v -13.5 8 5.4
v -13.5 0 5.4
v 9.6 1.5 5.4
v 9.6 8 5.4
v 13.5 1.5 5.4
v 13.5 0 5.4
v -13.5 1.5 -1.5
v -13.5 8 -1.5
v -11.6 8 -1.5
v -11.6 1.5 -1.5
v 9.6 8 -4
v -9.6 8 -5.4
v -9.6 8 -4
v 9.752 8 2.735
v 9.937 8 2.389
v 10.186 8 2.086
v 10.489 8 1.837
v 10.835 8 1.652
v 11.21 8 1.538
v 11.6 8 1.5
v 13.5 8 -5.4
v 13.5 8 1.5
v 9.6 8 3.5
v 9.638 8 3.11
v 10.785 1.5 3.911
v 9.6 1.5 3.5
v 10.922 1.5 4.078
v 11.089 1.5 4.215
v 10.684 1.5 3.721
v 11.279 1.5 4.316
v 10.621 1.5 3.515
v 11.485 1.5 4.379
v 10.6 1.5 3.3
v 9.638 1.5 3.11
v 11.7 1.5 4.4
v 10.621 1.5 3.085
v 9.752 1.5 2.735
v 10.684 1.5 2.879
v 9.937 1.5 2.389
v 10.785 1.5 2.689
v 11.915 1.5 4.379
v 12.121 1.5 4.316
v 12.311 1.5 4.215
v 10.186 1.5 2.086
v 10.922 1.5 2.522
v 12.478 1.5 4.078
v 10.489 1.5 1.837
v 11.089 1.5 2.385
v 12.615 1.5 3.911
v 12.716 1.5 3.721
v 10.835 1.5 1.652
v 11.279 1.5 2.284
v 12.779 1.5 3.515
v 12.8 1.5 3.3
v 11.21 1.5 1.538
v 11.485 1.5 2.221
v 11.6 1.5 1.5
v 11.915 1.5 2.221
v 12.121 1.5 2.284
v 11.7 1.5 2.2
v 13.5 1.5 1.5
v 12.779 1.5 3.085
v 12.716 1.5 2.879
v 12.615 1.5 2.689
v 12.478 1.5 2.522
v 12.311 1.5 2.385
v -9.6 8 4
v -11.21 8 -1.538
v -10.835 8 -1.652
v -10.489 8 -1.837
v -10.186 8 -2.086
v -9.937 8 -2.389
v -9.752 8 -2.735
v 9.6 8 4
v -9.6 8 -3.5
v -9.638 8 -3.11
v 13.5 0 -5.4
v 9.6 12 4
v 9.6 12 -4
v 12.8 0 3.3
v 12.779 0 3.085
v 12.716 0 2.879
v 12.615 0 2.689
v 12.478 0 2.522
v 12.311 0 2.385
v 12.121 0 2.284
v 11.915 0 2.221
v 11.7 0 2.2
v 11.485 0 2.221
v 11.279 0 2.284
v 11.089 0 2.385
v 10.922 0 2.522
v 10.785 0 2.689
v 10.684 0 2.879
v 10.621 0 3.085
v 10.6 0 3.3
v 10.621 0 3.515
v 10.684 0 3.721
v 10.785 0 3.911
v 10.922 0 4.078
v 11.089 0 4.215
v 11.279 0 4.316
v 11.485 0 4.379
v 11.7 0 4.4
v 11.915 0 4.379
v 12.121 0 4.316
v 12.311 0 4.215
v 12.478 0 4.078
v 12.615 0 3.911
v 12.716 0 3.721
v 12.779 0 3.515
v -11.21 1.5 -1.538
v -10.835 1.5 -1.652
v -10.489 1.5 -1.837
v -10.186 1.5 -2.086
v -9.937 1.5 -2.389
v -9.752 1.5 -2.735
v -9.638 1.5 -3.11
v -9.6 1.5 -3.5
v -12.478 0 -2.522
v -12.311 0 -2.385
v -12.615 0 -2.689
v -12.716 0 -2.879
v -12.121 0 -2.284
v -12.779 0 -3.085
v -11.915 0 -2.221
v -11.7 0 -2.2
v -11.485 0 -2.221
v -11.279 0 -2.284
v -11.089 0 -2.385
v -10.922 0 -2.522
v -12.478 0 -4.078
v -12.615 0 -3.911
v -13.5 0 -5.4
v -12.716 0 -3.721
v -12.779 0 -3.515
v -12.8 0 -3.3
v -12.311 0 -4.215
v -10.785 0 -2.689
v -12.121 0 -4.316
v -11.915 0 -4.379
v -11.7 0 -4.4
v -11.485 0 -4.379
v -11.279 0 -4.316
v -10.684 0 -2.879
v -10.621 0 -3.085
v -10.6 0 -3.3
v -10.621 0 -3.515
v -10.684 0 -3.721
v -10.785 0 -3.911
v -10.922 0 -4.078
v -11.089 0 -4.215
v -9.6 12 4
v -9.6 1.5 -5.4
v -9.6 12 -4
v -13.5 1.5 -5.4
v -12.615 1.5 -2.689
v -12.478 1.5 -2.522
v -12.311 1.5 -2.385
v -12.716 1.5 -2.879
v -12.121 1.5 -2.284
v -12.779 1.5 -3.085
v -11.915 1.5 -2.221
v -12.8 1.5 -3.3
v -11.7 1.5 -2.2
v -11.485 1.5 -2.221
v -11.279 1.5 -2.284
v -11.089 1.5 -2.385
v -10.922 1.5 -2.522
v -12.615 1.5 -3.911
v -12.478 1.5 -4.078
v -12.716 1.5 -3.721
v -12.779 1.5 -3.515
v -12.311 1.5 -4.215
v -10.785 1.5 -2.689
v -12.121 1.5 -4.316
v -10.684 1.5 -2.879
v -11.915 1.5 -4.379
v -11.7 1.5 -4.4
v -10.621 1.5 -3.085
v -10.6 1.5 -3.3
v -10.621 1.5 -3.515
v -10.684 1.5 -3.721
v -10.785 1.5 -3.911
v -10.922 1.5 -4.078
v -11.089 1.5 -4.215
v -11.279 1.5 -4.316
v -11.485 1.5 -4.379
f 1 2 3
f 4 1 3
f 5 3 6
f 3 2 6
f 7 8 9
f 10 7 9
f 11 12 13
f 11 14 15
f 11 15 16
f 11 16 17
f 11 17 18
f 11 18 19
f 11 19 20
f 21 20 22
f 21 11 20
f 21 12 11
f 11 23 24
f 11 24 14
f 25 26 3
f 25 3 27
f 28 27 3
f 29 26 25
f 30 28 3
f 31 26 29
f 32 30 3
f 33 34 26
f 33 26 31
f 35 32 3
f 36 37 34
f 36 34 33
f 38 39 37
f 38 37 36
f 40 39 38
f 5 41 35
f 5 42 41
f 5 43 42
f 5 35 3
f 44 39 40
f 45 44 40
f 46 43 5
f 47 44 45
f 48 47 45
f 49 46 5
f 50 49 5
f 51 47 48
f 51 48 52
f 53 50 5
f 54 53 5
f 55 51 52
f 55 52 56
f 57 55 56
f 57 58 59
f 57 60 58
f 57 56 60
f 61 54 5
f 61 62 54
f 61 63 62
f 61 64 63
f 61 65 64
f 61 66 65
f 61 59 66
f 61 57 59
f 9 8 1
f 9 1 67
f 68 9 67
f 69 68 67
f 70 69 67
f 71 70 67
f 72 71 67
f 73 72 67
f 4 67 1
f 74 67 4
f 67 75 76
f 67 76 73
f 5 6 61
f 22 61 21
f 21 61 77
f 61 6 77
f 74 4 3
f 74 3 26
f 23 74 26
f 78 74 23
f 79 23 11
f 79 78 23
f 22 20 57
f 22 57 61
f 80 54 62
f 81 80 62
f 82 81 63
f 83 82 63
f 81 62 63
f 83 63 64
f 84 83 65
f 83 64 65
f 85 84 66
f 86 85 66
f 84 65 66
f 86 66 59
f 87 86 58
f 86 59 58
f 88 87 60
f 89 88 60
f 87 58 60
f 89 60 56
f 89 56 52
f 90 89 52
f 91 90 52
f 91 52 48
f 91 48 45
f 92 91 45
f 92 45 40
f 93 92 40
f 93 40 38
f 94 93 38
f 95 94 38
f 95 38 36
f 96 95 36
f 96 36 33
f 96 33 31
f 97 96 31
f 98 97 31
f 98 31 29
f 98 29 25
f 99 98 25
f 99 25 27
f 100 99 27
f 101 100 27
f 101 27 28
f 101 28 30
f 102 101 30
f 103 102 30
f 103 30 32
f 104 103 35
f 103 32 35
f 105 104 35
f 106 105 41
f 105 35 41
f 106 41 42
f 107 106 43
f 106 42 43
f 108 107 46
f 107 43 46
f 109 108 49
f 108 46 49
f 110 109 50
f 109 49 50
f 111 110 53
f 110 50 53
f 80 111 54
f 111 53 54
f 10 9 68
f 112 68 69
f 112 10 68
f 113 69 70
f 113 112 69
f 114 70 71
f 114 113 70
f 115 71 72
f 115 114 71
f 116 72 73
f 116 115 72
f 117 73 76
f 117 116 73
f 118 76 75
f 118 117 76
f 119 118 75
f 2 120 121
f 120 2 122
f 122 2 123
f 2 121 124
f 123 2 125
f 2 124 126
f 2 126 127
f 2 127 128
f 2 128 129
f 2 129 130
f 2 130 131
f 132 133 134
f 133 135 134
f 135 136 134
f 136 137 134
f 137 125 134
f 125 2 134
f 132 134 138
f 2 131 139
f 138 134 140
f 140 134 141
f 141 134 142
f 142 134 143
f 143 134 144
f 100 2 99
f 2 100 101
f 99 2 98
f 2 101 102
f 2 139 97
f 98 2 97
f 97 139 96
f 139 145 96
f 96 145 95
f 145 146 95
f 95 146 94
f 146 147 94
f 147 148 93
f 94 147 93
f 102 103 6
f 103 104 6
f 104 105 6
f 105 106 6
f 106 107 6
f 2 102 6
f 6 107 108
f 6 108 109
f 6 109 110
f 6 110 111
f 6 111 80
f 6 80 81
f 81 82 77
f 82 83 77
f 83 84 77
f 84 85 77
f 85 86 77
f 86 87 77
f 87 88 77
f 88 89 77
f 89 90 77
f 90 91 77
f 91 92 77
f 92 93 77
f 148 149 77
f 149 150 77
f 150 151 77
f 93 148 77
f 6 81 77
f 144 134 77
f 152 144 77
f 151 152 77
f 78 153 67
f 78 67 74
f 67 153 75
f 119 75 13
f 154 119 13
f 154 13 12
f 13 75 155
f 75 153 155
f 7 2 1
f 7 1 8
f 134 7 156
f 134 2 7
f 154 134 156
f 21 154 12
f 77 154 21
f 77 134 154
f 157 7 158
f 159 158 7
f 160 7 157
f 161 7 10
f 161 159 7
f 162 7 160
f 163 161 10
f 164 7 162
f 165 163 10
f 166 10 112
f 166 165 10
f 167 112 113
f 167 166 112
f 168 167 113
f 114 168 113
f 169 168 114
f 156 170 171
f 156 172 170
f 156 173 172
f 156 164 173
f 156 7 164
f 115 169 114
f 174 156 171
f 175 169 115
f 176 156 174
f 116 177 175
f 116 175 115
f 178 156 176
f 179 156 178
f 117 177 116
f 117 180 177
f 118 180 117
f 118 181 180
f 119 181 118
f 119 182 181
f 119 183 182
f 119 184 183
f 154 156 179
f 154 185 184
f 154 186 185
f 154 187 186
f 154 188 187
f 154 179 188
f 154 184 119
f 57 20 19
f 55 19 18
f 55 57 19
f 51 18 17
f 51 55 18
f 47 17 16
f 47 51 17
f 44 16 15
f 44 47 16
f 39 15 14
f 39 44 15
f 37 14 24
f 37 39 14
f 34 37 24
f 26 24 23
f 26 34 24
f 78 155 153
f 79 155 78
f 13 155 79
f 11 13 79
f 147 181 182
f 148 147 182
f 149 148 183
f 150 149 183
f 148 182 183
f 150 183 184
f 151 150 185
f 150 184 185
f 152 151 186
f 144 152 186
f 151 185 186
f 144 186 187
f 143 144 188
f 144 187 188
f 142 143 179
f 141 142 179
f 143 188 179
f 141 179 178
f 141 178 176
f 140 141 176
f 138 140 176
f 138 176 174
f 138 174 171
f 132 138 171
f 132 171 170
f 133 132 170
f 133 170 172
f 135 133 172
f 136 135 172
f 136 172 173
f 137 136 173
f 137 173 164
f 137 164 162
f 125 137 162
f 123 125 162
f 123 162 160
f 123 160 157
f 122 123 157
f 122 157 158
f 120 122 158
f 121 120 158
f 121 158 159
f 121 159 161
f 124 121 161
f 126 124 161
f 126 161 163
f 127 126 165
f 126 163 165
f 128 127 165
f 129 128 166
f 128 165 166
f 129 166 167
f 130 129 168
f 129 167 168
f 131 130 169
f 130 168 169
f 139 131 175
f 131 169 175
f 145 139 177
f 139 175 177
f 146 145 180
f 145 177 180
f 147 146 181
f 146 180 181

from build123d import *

# Parameters (mm, degrees)
SKETCH_1_W          = 27
SKETCH_1_H          = 10.8
EXTRUDE_1_DEPTH     = 12
SKETCH_2_W          = 3.9
SKETCH_2_H          = 3.9
CUT_EXTRUDE_1_DEPTH = 10.5
FILLET_1_R          = 2
SKETCH_3_R          = 1.1
CUT_EXTRUDE_2_DEPTH = 40.5
SKETCH_4_W          = 27
SKETCH_4_H          = 10.8
SKETCH_4_W_2        = 19.2
SKETCH_4_H_2        = 8
CUT_EXTRUDE_3_DEPTH = 4


with BuildPart() as part:
    # 스케치1 → 보스-돌출1 (new body)
    with BuildSketch(Plane(origin=(0, 0, 0), x_dir=(1, 0, 0), z_dir=(0, 1, 0))):
        Rectangle(SKETCH_1_W, SKETCH_1_H)
    extrude(amount=EXTRUDE_1_DEPTH)

    # 스케치2 → 컷-돌출1 (cut)
    with BuildSketch(Plane(origin=(0, 12, 0), x_dir=(1, 0, 0), z_dir=(0, 1, 0))):
        with Locations((-11.55, 3.45)):
            Rectangle(SKETCH_2_W, SKETCH_2_H)
        with Locations((11.55, -3.45)):
            Rectangle(SKETCH_2_W, SKETCH_2_H)
    extrude(amount=-CUT_EXTRUDE_1_DEPTH, mode=Mode.SUBTRACT)

    # 필렛1
    fillet_1_edges = [part.edges().sort_by_distance(p)[0] for p in [
        (-9.6, 6.75, -1.5),
        (9.6, 6.75, 1.5),
    ]]
    fillet(fillet_1_edges, radius=FILLET_1_R)

    # 스케치3 → 컷-돌출2 (cut)
    with BuildSketch(Plane(origin=(0, 12, 0), x_dir=(1, 0, 0), z_dir=(0, 1, 0))):
        with Locations((-11.7, 3.3)):
            Circle(SKETCH_3_R)
        with Locations((11.7, -3.3)):
            Circle(SKETCH_3_R)
    extrude(amount=-CUT_EXTRUDE_2_DEPTH, mode=Mode.SUBTRACT)

    # 스케치4 → 컷-돌출3 (cut)
    with BuildSketch(Plane(origin=(0, 12, 0), x_dir=(1, 0, 0), z_dir=(0, 1, 0))):
        Rectangle(SKETCH_4_W, SKETCH_4_H)
        Rectangle(SKETCH_4_W_2, SKETCH_4_H_2, mode=Mode.SUBTRACT)
    extrude(amount=-CUT_EXTRUDE_3_DEPTH, mode=Mode.SUBTRACT)


solid = part.part
